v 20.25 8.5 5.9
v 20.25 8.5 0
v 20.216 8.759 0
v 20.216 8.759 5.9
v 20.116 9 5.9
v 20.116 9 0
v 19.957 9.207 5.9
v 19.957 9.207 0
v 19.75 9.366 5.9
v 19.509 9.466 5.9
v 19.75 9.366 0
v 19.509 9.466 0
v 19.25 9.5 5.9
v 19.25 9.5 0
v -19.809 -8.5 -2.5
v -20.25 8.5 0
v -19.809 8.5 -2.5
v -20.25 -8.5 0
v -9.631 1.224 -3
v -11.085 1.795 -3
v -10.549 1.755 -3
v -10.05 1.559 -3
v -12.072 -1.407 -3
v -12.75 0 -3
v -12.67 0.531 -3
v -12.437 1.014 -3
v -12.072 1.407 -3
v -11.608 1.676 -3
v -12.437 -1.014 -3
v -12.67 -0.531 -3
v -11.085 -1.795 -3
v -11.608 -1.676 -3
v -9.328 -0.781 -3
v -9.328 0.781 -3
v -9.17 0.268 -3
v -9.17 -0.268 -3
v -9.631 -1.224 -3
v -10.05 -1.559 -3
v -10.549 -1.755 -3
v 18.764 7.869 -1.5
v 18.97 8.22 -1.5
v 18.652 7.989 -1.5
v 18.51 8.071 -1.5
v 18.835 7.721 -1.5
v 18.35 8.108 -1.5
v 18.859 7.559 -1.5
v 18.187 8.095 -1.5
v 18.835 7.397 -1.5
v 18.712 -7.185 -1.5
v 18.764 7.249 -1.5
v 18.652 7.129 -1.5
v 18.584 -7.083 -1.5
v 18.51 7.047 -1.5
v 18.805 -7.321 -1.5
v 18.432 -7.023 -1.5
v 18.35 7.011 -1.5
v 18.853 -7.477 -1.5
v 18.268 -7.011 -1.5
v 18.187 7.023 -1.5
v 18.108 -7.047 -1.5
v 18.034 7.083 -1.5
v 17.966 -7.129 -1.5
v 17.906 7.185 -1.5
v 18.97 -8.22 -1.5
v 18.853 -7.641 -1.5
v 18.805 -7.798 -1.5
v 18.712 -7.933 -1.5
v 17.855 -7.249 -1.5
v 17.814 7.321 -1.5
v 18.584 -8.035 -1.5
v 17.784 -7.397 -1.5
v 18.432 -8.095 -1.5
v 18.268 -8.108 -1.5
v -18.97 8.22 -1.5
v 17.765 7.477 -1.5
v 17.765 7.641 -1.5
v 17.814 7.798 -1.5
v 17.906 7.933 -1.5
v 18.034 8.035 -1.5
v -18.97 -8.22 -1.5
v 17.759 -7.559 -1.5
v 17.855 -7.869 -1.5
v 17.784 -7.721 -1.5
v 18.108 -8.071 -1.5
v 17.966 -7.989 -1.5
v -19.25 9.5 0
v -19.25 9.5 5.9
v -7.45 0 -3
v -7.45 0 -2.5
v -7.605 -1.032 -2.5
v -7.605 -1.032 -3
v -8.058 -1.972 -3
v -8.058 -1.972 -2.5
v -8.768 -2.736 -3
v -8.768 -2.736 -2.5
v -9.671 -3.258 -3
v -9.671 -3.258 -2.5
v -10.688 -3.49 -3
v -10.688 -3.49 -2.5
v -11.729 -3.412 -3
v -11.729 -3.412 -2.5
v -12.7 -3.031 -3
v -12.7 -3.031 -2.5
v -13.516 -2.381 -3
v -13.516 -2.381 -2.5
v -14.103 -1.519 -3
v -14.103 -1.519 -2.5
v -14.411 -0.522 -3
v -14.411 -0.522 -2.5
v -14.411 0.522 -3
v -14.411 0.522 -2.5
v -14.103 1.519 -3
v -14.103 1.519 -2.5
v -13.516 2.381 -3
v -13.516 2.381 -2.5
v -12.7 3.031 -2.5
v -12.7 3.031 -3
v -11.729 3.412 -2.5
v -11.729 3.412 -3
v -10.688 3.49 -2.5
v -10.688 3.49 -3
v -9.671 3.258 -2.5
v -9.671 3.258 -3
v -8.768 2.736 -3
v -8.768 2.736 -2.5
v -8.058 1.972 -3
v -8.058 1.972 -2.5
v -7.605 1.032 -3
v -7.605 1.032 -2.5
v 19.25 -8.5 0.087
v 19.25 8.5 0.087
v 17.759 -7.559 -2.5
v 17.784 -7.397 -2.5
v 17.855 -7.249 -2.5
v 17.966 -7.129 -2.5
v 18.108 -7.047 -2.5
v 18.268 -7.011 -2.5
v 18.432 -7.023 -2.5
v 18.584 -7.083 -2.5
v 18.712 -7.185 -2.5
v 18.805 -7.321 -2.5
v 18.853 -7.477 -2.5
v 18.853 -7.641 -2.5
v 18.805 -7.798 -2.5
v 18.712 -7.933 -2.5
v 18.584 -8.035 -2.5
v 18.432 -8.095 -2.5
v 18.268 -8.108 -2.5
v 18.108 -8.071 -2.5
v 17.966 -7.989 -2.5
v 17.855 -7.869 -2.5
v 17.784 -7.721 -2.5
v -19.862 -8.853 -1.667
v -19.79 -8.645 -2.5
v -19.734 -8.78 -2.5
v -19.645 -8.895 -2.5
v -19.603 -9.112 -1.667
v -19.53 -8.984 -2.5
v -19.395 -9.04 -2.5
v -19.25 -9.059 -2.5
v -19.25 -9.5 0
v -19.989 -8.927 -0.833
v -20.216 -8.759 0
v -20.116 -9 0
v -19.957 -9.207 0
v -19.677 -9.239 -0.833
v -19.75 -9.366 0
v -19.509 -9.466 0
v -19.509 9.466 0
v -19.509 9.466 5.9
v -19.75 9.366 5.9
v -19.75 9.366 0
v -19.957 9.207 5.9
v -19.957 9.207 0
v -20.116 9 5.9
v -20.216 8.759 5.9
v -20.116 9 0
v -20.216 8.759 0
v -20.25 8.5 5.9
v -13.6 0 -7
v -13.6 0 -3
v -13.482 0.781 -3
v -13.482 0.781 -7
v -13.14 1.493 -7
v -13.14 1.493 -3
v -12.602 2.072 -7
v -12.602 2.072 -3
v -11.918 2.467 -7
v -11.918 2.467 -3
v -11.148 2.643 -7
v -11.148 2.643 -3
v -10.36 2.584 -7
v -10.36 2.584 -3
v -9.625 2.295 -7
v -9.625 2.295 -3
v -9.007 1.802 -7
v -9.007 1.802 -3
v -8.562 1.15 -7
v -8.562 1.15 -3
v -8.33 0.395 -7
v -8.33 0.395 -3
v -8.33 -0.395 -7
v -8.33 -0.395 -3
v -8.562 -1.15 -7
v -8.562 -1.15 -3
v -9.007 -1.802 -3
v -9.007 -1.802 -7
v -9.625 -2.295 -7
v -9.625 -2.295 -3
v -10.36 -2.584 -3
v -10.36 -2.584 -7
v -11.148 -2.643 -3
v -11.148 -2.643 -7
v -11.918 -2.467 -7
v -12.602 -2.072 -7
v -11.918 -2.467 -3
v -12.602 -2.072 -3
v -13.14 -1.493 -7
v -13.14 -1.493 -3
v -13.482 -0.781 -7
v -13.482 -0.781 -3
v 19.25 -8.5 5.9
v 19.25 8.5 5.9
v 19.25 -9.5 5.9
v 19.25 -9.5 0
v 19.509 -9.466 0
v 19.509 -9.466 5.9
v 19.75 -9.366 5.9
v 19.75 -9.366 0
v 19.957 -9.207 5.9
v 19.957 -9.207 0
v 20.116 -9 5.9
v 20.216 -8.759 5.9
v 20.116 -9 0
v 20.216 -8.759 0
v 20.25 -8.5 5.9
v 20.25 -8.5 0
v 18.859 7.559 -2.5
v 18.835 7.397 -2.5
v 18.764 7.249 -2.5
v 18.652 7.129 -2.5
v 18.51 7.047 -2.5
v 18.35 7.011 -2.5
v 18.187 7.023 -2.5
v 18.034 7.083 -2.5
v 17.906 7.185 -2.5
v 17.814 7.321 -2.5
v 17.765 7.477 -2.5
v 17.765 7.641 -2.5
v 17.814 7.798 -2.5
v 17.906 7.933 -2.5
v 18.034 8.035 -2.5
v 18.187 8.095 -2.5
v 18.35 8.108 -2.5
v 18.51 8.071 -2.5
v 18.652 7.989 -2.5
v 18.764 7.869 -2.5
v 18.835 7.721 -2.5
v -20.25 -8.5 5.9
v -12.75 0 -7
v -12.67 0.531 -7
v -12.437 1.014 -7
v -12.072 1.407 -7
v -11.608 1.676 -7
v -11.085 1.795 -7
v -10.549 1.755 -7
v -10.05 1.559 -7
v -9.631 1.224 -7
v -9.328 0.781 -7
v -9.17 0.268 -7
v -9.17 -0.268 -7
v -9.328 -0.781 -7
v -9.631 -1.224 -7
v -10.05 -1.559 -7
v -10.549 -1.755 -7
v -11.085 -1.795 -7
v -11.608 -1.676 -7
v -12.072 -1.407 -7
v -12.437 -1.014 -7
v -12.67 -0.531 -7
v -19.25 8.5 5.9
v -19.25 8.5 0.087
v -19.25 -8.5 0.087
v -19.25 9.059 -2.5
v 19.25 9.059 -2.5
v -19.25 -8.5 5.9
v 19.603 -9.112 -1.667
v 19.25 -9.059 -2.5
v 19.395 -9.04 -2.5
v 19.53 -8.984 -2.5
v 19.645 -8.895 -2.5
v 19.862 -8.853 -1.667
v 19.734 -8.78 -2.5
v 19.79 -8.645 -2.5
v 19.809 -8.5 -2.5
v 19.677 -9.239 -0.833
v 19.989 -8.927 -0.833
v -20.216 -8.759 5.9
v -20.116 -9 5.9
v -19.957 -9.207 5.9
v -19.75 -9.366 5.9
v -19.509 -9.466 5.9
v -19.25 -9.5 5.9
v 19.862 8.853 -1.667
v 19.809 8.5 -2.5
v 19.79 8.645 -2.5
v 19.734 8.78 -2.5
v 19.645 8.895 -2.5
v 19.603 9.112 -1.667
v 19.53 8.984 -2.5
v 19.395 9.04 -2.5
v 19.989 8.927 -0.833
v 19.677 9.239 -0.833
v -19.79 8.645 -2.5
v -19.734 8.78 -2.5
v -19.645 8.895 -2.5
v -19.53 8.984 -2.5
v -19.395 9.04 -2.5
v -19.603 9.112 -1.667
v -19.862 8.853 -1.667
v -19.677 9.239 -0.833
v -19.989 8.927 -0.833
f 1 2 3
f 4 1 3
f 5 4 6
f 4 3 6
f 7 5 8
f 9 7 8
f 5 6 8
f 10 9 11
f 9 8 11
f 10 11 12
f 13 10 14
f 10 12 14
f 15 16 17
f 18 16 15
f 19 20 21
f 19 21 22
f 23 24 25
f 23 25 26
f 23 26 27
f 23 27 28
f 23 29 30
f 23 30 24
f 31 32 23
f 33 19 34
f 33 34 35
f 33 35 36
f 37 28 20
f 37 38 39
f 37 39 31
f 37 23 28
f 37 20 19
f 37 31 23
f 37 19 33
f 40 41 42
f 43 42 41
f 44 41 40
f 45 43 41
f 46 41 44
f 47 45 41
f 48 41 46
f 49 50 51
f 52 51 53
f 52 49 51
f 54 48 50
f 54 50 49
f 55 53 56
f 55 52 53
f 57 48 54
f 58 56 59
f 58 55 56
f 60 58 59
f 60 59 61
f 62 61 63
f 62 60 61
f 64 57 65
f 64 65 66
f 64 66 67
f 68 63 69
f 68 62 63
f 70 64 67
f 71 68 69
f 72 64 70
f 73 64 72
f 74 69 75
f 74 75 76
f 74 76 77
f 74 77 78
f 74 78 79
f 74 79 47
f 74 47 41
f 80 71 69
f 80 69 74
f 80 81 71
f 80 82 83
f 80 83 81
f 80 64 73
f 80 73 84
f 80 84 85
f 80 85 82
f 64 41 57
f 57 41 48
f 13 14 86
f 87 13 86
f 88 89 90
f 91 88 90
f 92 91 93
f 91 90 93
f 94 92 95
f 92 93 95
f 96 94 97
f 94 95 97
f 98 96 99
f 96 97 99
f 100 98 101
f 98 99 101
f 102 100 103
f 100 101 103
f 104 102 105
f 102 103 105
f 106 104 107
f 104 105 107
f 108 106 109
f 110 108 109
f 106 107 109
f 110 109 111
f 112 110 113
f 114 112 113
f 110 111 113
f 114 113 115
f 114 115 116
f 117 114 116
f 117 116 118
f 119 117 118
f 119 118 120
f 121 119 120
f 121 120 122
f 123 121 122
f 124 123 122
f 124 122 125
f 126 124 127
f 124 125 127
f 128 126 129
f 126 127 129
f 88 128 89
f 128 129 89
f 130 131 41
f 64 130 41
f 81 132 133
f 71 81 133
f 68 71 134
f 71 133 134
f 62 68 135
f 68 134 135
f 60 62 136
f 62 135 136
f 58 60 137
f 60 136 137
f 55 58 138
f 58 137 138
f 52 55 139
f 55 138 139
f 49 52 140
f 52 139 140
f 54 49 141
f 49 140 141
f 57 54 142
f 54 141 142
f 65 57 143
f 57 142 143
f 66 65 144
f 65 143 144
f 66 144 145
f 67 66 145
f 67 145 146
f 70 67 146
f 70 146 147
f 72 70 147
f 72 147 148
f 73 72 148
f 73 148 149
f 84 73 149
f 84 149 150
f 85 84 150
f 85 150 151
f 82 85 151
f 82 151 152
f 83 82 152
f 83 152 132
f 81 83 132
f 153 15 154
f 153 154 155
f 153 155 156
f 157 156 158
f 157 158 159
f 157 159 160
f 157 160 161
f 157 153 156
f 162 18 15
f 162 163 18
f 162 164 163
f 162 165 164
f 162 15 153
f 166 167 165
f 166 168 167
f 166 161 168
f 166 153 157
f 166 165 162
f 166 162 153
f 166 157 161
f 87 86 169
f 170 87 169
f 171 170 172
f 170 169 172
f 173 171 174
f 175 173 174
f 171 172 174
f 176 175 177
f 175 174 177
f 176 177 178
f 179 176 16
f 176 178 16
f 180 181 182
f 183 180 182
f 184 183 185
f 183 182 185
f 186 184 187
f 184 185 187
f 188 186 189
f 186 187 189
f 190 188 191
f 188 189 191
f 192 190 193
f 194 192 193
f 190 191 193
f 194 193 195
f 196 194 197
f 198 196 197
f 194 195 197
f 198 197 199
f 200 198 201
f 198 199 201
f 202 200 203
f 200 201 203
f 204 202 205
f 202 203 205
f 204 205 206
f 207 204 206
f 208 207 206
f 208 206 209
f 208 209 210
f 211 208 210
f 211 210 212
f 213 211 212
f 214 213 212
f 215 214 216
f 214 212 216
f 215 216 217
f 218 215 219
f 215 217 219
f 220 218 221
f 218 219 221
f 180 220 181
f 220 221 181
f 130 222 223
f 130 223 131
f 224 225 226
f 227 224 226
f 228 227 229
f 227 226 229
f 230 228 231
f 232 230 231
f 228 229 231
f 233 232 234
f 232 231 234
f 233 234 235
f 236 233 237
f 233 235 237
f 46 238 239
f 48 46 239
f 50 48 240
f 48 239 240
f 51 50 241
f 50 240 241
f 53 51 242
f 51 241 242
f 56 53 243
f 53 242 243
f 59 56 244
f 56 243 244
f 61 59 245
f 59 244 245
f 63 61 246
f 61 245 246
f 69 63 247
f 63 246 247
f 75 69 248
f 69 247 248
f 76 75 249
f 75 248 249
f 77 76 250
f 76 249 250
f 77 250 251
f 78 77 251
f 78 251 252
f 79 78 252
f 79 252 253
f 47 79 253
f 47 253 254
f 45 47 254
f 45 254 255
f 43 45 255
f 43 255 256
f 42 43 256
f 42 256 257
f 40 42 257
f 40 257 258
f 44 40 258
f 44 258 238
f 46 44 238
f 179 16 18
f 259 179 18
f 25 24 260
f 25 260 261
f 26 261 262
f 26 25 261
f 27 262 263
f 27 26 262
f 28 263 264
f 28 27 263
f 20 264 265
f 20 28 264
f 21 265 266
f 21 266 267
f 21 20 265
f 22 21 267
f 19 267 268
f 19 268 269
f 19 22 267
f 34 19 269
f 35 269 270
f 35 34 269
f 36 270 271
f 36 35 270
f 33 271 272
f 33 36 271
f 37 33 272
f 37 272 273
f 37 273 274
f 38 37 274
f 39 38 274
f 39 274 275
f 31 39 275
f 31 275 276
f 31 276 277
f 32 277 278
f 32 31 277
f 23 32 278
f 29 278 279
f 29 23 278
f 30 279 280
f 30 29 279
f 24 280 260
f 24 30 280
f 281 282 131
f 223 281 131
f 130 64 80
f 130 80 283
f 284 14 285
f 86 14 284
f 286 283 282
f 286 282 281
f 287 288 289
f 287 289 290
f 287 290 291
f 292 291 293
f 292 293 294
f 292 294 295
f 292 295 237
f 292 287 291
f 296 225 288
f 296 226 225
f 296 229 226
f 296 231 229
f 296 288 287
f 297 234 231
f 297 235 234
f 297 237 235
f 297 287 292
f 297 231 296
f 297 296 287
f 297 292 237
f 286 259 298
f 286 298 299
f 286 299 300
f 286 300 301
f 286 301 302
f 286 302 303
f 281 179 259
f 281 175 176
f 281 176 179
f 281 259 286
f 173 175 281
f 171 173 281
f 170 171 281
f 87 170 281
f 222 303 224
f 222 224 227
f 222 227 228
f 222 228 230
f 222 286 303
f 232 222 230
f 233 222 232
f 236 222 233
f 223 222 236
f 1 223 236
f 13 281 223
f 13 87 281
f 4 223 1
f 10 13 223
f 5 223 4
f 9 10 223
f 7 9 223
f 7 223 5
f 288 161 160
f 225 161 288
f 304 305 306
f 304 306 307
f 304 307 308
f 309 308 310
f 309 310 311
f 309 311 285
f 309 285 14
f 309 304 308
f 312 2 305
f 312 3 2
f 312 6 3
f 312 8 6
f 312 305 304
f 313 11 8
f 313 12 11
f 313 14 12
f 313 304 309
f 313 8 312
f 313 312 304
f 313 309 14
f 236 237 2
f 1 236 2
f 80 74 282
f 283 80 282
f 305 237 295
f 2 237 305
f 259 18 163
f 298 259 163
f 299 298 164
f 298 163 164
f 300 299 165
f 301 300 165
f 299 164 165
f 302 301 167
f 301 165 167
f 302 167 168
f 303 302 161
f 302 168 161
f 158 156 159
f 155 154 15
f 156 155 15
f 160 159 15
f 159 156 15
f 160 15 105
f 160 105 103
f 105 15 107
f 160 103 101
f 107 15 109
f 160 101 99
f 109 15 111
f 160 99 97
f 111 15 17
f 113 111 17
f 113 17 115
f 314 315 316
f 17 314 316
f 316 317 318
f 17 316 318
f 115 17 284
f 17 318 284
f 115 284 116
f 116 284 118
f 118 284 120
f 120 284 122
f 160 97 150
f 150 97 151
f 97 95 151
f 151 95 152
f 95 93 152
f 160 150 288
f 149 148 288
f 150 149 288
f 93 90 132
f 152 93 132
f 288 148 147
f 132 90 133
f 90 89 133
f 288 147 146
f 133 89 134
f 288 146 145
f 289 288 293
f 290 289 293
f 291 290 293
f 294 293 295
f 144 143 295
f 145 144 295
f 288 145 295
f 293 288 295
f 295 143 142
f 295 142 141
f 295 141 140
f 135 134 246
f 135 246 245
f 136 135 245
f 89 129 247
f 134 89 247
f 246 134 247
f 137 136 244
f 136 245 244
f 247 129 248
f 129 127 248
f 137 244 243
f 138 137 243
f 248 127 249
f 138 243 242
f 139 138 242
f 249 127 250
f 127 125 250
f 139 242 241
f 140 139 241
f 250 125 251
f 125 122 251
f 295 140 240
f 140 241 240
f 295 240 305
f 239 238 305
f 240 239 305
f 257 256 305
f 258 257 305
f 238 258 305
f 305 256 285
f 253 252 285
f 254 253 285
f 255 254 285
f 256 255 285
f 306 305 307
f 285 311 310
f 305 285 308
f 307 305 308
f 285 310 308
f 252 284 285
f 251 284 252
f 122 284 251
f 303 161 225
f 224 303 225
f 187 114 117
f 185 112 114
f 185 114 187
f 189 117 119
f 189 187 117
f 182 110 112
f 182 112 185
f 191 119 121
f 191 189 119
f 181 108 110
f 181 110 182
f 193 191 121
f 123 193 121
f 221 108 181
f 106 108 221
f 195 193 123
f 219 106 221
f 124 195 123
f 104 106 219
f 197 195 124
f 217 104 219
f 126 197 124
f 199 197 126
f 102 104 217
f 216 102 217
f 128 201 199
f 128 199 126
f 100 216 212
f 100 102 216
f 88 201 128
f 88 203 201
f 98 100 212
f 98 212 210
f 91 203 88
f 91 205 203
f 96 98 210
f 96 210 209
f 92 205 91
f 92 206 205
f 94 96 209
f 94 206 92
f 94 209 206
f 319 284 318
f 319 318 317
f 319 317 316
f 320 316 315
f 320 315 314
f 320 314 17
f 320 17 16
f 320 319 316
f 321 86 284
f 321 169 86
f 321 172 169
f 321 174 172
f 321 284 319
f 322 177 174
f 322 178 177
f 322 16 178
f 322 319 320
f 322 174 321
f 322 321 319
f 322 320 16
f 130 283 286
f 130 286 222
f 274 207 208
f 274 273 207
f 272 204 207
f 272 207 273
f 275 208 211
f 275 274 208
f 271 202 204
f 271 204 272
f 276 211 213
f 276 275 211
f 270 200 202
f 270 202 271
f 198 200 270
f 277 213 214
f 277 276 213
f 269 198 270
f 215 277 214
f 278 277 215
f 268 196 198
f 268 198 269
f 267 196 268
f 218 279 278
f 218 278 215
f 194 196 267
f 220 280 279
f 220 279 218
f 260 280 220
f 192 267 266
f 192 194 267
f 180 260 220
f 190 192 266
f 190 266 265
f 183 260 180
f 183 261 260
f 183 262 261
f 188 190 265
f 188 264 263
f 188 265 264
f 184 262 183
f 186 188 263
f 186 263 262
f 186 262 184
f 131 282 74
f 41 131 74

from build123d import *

# Parameters (mm, degrees)
SALIENTE_EXTRUIR1_DEPTH = 5.9
SALIENTE_EXTRUIR2_DEPTH = 2.5
SALIENTE_EXTRUIR2_DRAFT = -10
VACIADO1_START          = -8.5
VACIADO1_DEPTH          = 17
VACIADO1_START_2        = -19.25
VACIADO1_2_DEPTH        = 38.5
SKETCH1_R               = 3.5
BOSS_EXTRUDE1_DEPTH     = 0.5
SKETCH2_R               = 2.65
SKETCH2_R_2             = 1.8
BOSS_EXTRUDE2_DEPTH     = 4
SKETCH3_R               = 0.55
CUT_EXTRUDE1_DEPTH      = 10


with BuildPart() as part:
    # Croquis1 → Saliente-Extruir1 (new body)
    with BuildSketch(Plane.XY):
        with BuildLine():
            Line((-20.25, 8.5), (-20.25, -8.5))
            ThreePointArc((-20.25, -8.5), (-19.957106781, -9.207106781), (-19.25, -9.5))
            Line((-19.25, -9.5), (19.25, -9.5))
            ThreePointArc((19.25, -9.5), (19.957106781, -9.207106781), (20.25, -8.5))
            Line((20.25, -8.5), (20.25, 8.5))
            ThreePointArc((20.25, 8.5), (19.957106781, 9.207106781), (19.25, 9.5))
            Line((19.25, 9.5), (-19.25, 9.5))
            ThreePointArc((-19.25, 9.5), (-19.957106781, 9.207106781), (-20.25, 8.5))
        make_face()
    extrude(amount=SALIENTE_EXTRUIR1_DEPTH)


with BuildPart() as saliente_extruir2_tool:
    # Croquis1<2> → Saliente-Extruir2 (with draft: the straight prism first)
    with BuildSketch(Plane.XY):
        with BuildLine():
            Line((-20.25, 8.5), (-20.25, -8.5))
            ThreePointArc((-20.25, -8.5), (-19.957106781, -9.207106781), (-19.25, -9.5))
            Line((-19.25, -9.5), (19.25, -9.5))
            ThreePointArc((19.25, -9.5), (19.957106781, -9.207106781), (20.25, -8.5))
            Line((20.25, -8.5), (20.25, 8.5))
            ThreePointArc((20.25, 8.5), (19.957106781, 9.207106781), (19.25, 9.5))
            Line((19.25, 9.5), (-19.25, 9.5))
            ThreePointArc((-19.25, 9.5), (-19.957106781, 9.207106781), (-20.25, 8.5))
        make_face()
    extrude(amount=-SALIENTE_EXTRUIR2_DEPTH)
    # Saliente-Extruir2: the draft: its side faces are tilted about the plane it starts from
    saliente_extruir2_sides = [saliente_extruir2_tool.faces().sort_by_distance(p)[0] for p in [
        (0, 9.5, -1.25),
        (-19.957106781, 9.207106781, -1.25),
        (-20.25, 0, -1.25),
        (-19.957106781, -9.207106781, -1.25),
        (0, -9.5, -1.25),
        (19.957106781, -9.207106781, -1.25),
        (20.25, 0, -1.25),
        (19.957106781, 9.207106781, -1.25),
    ]]
    draft(saliente_extruir2_sides, Plane.XY, SALIENTE_EXTRUIR2_DRAFT)


with BuildPart() as part_1:
    add(part.part)

    # Saliente-Extruir2: add saliente_extruir2_tool
    add(saliente_extruir2_tool.part)

    # Vaciado1: read off the stored shape, not the designer's step
    # Vaciado1 outline → Vaciado1 (cut)
    with BuildSketch(Plane(origin=(0, 0, 0), x_dir=(1, 0, 0), z_dir=(0, 1, 0)).offset(VACIADO1_START)):
        Polygon((-19.25, -0.087488664), (-19.25, -5.9), (19.25, -5.9), (19.25, -0.087488664), (18.970082917, 1.5), (-18.970082917, 1.5), align=None)
    extrude(amount=VACIADO1_DEPTH, mode=Mode.SUBTRACT)

    # Vaciado1 2 outline → Vaciado1 2 (add)
    with BuildSketch(Plane.YZ.offset(VACIADO1_START_2)):
        Polygon((8.5, 0.087488664), (8.220082917, -1.5), (8.5, -1.5), align=None)
        Polygon((-8.220082917, -1.5), (-8.5, 0.087488664), (-8.5, -1.5), align=None)
    extrude(amount=VACIADO1_2_DEPTH)

    # Sketch1 → Boss-Extrude1 (add)
    with BuildSketch(Plane(origin=(0, 0, -2.5), x_dir=(-1, 0, 0), z_dir=(0, 0, -1))):
        with Locations(Location((10.95, 0, 0), (0, 0, 180))):
            Circle(SKETCH1_R)
    extrude(amount=BOSS_EXTRUDE1_DEPTH)

    # Sketch2 → Boss-Extrude2 (add)
    with BuildSketch(Plane(origin=(0, 0, -3), x_dir=(-1, 0, 0), z_dir=(0, 0, -1))):
        with Locations((10.95, 0)):
            Circle(SKETCH2_R)
        with Locations((10.95, 0)):
            Circle(SKETCH2_R_2, mode=Mode.SUBTRACT)
    extrude(amount=BOSS_EXTRUDE2_DEPTH)

    # Sketch3 → Cut-Extrude1 (cut)
    with BuildSketch(Plane(origin=(0, 0, -2.5), x_dir=(-1, 0, 0), z_dir=(0, 0, -1))):
        with Locations((-18.309182548, -7.559182548)):
            Circle(SKETCH3_R)
        with Locations(Location((-18.309182548, 7.559182548, 0), (0, 0, 180))):
            Circle(SKETCH3_R)
    extrude(amount=-CUT_EXTRUDE1_DEPTH, mode=Mode.SUBTRACT)


solid = part_1.part
